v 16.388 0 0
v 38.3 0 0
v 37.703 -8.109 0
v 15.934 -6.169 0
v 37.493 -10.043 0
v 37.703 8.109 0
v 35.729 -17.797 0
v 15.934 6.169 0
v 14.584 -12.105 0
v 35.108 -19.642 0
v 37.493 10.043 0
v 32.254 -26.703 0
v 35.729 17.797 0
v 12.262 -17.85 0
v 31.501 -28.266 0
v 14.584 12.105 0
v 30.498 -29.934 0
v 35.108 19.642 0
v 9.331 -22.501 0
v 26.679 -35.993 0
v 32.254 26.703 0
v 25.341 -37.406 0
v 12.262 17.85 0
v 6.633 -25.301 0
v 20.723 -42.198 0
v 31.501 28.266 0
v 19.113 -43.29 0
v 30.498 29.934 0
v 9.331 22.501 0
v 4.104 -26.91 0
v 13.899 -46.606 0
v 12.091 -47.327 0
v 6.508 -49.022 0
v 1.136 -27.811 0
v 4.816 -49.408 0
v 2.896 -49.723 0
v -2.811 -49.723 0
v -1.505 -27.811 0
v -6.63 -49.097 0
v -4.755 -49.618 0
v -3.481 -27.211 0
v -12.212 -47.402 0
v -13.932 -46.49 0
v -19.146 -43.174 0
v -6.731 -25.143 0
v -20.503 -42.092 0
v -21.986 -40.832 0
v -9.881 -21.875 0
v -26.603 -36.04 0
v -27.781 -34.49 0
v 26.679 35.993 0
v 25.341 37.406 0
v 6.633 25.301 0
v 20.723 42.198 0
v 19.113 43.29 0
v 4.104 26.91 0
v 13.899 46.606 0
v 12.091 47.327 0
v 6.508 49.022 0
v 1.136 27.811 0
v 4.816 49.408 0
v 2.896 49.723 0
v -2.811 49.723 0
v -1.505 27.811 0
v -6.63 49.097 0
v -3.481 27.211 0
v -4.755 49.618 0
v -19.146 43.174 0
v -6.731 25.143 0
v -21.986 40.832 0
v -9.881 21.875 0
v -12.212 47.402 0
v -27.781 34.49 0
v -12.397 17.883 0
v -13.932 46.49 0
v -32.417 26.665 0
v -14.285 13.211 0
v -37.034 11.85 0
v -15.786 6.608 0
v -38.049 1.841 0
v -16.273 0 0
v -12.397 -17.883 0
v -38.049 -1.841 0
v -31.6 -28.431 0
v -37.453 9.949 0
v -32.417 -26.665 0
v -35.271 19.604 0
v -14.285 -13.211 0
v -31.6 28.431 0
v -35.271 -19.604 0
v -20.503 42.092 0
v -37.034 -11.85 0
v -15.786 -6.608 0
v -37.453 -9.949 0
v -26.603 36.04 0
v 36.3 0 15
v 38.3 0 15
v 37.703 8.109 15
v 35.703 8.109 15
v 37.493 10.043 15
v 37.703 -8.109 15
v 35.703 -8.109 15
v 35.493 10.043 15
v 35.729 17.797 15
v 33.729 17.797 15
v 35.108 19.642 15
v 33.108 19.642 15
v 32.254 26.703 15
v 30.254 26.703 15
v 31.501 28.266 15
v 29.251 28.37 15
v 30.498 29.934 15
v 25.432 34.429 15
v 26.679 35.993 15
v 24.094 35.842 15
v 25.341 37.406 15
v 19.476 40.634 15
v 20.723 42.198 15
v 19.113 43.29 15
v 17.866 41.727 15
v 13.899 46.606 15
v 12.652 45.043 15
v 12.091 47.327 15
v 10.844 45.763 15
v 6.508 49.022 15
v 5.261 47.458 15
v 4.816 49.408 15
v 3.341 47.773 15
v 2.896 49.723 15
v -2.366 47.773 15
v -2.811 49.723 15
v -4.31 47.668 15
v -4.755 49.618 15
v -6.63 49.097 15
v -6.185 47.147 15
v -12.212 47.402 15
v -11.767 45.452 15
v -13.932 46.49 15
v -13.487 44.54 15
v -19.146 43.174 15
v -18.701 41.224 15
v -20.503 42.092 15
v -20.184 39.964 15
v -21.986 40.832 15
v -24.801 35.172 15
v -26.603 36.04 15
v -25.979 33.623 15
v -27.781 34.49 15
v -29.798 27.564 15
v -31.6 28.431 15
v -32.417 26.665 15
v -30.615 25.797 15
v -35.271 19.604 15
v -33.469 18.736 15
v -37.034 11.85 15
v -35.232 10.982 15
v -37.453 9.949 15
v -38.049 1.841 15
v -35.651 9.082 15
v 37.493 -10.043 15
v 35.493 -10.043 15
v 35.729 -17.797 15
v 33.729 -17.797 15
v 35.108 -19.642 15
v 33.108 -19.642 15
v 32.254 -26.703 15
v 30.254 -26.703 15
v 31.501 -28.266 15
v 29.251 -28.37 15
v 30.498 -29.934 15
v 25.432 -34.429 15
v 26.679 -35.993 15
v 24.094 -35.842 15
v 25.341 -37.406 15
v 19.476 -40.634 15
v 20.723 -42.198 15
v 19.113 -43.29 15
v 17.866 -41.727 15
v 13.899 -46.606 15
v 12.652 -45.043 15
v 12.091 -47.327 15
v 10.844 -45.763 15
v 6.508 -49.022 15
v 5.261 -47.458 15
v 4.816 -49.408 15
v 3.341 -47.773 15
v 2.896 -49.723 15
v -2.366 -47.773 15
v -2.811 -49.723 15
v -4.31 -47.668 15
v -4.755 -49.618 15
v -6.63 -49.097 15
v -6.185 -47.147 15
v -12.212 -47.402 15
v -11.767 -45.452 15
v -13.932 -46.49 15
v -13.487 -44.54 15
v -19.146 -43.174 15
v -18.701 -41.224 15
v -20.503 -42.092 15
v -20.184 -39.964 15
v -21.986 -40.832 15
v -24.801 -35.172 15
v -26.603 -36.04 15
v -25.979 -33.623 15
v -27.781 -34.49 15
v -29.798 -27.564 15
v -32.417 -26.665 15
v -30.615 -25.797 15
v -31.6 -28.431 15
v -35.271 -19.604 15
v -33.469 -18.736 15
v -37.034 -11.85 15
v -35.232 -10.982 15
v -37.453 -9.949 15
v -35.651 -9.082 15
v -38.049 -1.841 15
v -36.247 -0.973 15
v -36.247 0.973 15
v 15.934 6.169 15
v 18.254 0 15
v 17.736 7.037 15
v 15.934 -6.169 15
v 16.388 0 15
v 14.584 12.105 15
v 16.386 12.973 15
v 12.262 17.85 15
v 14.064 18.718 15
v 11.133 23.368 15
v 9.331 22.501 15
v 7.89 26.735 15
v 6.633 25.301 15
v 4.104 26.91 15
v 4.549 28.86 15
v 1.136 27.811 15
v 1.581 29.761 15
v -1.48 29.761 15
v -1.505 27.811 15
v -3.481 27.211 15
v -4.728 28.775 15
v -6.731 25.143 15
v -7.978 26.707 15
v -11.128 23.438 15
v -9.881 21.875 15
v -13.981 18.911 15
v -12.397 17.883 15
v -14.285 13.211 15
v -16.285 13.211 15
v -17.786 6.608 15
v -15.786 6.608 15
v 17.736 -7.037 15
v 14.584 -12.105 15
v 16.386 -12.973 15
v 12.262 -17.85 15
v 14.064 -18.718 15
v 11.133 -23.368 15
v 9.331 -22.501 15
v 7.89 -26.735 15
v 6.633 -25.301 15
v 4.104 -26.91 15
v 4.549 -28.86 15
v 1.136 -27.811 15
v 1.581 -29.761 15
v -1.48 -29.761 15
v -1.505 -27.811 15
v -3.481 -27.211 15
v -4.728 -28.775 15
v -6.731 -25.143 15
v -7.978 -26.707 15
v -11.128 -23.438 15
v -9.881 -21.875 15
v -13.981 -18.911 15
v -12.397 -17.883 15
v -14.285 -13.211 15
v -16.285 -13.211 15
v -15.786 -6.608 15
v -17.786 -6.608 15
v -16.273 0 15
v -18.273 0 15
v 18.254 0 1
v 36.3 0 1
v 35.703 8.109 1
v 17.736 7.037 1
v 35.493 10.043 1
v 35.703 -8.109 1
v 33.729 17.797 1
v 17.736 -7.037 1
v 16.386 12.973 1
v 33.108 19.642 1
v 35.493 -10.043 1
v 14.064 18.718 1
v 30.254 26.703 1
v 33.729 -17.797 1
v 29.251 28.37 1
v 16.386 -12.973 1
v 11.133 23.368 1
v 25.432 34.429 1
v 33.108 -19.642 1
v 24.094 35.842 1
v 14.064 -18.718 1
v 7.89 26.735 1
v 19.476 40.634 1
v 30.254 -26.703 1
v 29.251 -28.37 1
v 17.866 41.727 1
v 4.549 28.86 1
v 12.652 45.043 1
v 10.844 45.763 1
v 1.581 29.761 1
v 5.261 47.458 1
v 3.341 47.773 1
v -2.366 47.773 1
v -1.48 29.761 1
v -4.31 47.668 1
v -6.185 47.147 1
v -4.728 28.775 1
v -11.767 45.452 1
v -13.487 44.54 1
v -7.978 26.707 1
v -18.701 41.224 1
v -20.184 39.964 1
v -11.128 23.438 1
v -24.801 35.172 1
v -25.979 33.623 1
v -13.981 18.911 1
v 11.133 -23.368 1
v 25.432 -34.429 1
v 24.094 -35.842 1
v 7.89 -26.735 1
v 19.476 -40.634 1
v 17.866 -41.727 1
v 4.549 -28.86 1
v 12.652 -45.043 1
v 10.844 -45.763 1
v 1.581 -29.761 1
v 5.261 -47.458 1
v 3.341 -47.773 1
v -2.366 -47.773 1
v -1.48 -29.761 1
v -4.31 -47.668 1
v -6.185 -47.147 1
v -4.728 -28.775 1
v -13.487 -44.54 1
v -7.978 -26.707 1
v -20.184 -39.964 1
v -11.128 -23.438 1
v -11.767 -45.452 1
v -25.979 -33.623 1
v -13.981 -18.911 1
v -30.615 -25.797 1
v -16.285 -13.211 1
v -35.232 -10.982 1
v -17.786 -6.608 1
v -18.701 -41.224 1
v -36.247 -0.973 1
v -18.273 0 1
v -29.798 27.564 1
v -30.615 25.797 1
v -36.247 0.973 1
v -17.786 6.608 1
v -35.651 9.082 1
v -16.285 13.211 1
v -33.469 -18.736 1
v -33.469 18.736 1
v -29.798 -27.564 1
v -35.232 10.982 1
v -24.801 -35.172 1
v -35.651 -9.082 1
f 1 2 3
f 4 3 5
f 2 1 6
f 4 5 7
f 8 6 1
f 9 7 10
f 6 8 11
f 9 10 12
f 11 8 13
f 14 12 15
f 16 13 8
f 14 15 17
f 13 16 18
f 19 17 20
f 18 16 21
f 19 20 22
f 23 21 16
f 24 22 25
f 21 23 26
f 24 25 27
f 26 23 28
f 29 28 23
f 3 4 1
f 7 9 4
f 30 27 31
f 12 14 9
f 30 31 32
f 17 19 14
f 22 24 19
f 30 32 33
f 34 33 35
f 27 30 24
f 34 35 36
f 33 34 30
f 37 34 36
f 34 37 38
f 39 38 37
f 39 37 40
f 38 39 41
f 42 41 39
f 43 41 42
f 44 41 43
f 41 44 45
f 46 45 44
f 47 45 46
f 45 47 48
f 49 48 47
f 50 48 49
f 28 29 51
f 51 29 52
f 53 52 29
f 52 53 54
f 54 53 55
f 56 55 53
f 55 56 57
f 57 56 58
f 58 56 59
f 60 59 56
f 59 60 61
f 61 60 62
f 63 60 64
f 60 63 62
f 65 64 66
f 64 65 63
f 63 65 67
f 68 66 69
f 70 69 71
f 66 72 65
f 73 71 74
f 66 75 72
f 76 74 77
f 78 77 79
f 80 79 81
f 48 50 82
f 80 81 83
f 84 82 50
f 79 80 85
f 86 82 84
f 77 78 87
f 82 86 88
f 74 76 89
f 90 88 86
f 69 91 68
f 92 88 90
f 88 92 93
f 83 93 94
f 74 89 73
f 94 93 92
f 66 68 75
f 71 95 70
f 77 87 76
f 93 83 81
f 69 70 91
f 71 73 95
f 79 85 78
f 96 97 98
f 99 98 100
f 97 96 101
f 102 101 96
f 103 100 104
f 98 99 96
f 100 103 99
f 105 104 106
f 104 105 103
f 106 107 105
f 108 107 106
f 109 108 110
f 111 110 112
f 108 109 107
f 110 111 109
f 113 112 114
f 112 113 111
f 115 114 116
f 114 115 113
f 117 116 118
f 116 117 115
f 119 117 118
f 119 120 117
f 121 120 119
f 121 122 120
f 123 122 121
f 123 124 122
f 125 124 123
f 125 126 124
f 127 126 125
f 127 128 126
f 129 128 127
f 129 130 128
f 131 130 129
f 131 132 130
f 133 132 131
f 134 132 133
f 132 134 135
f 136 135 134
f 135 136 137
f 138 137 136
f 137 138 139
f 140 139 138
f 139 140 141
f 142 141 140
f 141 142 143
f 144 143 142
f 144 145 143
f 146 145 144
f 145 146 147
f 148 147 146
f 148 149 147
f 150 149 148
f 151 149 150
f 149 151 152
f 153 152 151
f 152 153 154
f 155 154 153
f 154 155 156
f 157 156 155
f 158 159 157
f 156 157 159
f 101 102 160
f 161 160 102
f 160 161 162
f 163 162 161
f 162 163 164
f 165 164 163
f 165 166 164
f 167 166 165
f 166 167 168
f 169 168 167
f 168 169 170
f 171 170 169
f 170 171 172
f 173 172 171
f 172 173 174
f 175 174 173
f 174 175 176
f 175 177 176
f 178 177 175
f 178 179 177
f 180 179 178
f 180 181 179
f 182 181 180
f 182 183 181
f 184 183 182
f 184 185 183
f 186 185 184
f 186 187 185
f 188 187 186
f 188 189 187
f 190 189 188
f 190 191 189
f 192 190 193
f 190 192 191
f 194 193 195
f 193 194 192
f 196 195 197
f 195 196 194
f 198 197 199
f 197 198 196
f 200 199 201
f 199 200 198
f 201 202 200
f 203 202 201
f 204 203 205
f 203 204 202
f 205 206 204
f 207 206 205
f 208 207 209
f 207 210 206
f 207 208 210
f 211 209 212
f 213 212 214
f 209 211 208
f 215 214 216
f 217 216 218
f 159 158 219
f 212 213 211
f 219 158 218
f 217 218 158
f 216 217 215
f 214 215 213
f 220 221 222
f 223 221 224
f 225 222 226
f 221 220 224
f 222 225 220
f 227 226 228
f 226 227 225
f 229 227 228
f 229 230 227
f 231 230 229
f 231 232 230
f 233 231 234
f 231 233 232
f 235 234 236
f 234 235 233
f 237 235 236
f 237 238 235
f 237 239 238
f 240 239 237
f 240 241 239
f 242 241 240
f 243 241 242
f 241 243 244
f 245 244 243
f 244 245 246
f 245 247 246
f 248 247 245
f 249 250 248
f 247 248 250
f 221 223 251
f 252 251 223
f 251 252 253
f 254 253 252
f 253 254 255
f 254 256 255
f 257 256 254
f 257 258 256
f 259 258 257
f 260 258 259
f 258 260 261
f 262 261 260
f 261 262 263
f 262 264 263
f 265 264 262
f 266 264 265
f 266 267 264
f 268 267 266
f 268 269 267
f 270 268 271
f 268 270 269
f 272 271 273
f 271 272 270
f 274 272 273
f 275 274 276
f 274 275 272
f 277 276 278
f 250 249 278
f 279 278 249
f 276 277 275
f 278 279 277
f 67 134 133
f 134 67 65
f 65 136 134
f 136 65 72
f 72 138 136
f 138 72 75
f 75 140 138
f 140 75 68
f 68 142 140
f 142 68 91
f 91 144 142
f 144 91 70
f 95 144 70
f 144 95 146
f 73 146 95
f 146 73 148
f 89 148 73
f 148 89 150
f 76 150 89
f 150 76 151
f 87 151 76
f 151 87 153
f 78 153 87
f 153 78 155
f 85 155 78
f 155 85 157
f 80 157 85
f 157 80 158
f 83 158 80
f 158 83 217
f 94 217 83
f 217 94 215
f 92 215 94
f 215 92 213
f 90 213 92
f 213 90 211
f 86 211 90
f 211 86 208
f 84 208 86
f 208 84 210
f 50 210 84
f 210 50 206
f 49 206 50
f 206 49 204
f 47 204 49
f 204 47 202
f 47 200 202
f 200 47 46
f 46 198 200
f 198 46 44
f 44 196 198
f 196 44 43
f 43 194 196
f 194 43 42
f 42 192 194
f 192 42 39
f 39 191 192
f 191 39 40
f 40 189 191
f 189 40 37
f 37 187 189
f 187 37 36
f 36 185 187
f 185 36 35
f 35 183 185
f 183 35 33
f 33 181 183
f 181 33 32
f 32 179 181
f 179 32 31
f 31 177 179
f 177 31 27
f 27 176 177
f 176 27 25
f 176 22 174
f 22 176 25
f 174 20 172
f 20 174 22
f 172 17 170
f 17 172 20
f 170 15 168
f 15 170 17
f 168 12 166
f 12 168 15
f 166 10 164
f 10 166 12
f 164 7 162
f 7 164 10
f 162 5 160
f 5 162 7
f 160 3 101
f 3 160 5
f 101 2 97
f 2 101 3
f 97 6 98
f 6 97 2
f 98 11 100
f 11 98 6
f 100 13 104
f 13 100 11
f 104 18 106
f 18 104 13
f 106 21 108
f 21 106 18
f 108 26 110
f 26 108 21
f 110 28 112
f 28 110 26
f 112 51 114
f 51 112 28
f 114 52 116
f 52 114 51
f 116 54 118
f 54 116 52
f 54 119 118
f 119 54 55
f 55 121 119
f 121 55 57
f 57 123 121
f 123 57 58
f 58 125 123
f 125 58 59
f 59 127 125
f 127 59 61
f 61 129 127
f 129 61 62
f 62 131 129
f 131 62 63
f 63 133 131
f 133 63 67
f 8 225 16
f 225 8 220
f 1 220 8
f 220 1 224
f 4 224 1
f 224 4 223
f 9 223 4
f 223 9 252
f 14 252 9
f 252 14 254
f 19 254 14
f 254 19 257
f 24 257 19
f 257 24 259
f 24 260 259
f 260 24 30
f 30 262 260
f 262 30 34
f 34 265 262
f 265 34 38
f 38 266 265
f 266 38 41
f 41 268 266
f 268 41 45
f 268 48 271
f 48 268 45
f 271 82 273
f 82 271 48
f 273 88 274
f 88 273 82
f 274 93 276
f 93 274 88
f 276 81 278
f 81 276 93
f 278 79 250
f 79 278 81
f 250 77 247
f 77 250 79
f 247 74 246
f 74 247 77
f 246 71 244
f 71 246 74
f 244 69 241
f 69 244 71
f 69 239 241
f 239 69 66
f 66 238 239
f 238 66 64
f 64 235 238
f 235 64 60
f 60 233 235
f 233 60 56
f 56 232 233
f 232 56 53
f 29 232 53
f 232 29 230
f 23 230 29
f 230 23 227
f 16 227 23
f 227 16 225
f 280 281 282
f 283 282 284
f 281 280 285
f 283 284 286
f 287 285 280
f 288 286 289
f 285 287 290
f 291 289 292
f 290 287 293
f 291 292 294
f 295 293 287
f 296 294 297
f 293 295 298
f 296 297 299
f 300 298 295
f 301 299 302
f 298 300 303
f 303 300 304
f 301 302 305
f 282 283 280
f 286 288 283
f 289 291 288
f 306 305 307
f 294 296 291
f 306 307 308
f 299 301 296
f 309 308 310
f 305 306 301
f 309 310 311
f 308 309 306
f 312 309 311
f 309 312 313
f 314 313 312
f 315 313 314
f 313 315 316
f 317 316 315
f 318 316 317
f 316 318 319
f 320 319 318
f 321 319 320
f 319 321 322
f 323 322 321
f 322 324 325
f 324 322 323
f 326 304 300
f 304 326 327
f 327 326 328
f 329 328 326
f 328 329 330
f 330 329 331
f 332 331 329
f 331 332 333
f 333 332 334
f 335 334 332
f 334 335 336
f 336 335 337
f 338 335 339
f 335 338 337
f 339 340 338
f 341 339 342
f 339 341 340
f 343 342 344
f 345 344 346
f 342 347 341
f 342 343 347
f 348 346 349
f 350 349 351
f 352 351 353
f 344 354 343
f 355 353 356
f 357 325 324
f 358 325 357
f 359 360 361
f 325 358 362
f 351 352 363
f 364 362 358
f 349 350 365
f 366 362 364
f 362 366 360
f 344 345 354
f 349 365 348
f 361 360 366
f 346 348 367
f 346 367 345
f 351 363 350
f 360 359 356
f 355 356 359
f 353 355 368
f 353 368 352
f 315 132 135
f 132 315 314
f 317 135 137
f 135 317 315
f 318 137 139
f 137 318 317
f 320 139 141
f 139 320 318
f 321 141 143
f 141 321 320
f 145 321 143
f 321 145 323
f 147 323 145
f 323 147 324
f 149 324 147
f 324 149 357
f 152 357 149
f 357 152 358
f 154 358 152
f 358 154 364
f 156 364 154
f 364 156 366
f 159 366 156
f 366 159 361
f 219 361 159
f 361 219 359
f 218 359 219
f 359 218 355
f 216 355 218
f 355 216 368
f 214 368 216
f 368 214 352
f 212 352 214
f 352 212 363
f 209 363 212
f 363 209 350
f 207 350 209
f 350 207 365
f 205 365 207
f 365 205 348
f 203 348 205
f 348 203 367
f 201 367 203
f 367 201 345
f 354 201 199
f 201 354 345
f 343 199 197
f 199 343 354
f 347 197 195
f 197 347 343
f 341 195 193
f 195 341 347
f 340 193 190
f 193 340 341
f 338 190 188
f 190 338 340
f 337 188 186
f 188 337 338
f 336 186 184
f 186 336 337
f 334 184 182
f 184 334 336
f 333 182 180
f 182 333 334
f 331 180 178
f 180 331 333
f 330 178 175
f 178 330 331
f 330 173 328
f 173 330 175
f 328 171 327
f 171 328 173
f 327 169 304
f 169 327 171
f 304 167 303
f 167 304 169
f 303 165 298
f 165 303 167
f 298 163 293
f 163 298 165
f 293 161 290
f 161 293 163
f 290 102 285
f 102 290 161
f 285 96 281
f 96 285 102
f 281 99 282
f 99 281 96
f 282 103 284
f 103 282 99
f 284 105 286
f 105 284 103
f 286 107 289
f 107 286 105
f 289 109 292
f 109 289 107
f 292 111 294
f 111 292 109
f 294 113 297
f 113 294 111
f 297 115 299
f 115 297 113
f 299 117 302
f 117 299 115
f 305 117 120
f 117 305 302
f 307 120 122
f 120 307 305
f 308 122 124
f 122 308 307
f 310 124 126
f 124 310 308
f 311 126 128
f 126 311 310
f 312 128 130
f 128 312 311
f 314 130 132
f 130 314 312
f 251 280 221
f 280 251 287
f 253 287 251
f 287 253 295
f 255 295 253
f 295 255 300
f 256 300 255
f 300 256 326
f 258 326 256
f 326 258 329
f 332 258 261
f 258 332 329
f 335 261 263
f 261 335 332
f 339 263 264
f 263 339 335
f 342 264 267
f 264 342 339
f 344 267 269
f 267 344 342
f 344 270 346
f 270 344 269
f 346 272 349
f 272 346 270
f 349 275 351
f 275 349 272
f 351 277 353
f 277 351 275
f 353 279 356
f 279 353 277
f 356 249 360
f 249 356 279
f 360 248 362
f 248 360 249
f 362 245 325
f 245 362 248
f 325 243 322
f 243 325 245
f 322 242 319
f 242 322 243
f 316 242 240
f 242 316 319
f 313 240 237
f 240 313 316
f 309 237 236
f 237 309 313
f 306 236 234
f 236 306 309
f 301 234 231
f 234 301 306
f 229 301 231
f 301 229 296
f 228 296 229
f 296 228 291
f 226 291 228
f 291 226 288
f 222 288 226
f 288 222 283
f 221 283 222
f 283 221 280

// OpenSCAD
// file: cookie_lib.scad
module cookie_cutter() {
  difference() {
    linear_extrude(height=15) {
      minkowski() {
        children();
        circle(r=2);
      }
    }
    translate(v=[0, 0, 1])
      linear_extrude(height=15) {
        children();
      }
  }
}
// main file
include <cookie_lib.scad>

module o() {
  scale(v=[0.7, 1, 1])
    // (10cm / 2) - minkowski circle radius
    circle(r=39);
}

module ring() {
  minkowski() {
    difference() {
      o();
      scale(v=[0.999, 0.999, 1]) {
        o();
      }
    }
    circle(r=9);
  }
}

cookie_cutter() {
  ring();
}
